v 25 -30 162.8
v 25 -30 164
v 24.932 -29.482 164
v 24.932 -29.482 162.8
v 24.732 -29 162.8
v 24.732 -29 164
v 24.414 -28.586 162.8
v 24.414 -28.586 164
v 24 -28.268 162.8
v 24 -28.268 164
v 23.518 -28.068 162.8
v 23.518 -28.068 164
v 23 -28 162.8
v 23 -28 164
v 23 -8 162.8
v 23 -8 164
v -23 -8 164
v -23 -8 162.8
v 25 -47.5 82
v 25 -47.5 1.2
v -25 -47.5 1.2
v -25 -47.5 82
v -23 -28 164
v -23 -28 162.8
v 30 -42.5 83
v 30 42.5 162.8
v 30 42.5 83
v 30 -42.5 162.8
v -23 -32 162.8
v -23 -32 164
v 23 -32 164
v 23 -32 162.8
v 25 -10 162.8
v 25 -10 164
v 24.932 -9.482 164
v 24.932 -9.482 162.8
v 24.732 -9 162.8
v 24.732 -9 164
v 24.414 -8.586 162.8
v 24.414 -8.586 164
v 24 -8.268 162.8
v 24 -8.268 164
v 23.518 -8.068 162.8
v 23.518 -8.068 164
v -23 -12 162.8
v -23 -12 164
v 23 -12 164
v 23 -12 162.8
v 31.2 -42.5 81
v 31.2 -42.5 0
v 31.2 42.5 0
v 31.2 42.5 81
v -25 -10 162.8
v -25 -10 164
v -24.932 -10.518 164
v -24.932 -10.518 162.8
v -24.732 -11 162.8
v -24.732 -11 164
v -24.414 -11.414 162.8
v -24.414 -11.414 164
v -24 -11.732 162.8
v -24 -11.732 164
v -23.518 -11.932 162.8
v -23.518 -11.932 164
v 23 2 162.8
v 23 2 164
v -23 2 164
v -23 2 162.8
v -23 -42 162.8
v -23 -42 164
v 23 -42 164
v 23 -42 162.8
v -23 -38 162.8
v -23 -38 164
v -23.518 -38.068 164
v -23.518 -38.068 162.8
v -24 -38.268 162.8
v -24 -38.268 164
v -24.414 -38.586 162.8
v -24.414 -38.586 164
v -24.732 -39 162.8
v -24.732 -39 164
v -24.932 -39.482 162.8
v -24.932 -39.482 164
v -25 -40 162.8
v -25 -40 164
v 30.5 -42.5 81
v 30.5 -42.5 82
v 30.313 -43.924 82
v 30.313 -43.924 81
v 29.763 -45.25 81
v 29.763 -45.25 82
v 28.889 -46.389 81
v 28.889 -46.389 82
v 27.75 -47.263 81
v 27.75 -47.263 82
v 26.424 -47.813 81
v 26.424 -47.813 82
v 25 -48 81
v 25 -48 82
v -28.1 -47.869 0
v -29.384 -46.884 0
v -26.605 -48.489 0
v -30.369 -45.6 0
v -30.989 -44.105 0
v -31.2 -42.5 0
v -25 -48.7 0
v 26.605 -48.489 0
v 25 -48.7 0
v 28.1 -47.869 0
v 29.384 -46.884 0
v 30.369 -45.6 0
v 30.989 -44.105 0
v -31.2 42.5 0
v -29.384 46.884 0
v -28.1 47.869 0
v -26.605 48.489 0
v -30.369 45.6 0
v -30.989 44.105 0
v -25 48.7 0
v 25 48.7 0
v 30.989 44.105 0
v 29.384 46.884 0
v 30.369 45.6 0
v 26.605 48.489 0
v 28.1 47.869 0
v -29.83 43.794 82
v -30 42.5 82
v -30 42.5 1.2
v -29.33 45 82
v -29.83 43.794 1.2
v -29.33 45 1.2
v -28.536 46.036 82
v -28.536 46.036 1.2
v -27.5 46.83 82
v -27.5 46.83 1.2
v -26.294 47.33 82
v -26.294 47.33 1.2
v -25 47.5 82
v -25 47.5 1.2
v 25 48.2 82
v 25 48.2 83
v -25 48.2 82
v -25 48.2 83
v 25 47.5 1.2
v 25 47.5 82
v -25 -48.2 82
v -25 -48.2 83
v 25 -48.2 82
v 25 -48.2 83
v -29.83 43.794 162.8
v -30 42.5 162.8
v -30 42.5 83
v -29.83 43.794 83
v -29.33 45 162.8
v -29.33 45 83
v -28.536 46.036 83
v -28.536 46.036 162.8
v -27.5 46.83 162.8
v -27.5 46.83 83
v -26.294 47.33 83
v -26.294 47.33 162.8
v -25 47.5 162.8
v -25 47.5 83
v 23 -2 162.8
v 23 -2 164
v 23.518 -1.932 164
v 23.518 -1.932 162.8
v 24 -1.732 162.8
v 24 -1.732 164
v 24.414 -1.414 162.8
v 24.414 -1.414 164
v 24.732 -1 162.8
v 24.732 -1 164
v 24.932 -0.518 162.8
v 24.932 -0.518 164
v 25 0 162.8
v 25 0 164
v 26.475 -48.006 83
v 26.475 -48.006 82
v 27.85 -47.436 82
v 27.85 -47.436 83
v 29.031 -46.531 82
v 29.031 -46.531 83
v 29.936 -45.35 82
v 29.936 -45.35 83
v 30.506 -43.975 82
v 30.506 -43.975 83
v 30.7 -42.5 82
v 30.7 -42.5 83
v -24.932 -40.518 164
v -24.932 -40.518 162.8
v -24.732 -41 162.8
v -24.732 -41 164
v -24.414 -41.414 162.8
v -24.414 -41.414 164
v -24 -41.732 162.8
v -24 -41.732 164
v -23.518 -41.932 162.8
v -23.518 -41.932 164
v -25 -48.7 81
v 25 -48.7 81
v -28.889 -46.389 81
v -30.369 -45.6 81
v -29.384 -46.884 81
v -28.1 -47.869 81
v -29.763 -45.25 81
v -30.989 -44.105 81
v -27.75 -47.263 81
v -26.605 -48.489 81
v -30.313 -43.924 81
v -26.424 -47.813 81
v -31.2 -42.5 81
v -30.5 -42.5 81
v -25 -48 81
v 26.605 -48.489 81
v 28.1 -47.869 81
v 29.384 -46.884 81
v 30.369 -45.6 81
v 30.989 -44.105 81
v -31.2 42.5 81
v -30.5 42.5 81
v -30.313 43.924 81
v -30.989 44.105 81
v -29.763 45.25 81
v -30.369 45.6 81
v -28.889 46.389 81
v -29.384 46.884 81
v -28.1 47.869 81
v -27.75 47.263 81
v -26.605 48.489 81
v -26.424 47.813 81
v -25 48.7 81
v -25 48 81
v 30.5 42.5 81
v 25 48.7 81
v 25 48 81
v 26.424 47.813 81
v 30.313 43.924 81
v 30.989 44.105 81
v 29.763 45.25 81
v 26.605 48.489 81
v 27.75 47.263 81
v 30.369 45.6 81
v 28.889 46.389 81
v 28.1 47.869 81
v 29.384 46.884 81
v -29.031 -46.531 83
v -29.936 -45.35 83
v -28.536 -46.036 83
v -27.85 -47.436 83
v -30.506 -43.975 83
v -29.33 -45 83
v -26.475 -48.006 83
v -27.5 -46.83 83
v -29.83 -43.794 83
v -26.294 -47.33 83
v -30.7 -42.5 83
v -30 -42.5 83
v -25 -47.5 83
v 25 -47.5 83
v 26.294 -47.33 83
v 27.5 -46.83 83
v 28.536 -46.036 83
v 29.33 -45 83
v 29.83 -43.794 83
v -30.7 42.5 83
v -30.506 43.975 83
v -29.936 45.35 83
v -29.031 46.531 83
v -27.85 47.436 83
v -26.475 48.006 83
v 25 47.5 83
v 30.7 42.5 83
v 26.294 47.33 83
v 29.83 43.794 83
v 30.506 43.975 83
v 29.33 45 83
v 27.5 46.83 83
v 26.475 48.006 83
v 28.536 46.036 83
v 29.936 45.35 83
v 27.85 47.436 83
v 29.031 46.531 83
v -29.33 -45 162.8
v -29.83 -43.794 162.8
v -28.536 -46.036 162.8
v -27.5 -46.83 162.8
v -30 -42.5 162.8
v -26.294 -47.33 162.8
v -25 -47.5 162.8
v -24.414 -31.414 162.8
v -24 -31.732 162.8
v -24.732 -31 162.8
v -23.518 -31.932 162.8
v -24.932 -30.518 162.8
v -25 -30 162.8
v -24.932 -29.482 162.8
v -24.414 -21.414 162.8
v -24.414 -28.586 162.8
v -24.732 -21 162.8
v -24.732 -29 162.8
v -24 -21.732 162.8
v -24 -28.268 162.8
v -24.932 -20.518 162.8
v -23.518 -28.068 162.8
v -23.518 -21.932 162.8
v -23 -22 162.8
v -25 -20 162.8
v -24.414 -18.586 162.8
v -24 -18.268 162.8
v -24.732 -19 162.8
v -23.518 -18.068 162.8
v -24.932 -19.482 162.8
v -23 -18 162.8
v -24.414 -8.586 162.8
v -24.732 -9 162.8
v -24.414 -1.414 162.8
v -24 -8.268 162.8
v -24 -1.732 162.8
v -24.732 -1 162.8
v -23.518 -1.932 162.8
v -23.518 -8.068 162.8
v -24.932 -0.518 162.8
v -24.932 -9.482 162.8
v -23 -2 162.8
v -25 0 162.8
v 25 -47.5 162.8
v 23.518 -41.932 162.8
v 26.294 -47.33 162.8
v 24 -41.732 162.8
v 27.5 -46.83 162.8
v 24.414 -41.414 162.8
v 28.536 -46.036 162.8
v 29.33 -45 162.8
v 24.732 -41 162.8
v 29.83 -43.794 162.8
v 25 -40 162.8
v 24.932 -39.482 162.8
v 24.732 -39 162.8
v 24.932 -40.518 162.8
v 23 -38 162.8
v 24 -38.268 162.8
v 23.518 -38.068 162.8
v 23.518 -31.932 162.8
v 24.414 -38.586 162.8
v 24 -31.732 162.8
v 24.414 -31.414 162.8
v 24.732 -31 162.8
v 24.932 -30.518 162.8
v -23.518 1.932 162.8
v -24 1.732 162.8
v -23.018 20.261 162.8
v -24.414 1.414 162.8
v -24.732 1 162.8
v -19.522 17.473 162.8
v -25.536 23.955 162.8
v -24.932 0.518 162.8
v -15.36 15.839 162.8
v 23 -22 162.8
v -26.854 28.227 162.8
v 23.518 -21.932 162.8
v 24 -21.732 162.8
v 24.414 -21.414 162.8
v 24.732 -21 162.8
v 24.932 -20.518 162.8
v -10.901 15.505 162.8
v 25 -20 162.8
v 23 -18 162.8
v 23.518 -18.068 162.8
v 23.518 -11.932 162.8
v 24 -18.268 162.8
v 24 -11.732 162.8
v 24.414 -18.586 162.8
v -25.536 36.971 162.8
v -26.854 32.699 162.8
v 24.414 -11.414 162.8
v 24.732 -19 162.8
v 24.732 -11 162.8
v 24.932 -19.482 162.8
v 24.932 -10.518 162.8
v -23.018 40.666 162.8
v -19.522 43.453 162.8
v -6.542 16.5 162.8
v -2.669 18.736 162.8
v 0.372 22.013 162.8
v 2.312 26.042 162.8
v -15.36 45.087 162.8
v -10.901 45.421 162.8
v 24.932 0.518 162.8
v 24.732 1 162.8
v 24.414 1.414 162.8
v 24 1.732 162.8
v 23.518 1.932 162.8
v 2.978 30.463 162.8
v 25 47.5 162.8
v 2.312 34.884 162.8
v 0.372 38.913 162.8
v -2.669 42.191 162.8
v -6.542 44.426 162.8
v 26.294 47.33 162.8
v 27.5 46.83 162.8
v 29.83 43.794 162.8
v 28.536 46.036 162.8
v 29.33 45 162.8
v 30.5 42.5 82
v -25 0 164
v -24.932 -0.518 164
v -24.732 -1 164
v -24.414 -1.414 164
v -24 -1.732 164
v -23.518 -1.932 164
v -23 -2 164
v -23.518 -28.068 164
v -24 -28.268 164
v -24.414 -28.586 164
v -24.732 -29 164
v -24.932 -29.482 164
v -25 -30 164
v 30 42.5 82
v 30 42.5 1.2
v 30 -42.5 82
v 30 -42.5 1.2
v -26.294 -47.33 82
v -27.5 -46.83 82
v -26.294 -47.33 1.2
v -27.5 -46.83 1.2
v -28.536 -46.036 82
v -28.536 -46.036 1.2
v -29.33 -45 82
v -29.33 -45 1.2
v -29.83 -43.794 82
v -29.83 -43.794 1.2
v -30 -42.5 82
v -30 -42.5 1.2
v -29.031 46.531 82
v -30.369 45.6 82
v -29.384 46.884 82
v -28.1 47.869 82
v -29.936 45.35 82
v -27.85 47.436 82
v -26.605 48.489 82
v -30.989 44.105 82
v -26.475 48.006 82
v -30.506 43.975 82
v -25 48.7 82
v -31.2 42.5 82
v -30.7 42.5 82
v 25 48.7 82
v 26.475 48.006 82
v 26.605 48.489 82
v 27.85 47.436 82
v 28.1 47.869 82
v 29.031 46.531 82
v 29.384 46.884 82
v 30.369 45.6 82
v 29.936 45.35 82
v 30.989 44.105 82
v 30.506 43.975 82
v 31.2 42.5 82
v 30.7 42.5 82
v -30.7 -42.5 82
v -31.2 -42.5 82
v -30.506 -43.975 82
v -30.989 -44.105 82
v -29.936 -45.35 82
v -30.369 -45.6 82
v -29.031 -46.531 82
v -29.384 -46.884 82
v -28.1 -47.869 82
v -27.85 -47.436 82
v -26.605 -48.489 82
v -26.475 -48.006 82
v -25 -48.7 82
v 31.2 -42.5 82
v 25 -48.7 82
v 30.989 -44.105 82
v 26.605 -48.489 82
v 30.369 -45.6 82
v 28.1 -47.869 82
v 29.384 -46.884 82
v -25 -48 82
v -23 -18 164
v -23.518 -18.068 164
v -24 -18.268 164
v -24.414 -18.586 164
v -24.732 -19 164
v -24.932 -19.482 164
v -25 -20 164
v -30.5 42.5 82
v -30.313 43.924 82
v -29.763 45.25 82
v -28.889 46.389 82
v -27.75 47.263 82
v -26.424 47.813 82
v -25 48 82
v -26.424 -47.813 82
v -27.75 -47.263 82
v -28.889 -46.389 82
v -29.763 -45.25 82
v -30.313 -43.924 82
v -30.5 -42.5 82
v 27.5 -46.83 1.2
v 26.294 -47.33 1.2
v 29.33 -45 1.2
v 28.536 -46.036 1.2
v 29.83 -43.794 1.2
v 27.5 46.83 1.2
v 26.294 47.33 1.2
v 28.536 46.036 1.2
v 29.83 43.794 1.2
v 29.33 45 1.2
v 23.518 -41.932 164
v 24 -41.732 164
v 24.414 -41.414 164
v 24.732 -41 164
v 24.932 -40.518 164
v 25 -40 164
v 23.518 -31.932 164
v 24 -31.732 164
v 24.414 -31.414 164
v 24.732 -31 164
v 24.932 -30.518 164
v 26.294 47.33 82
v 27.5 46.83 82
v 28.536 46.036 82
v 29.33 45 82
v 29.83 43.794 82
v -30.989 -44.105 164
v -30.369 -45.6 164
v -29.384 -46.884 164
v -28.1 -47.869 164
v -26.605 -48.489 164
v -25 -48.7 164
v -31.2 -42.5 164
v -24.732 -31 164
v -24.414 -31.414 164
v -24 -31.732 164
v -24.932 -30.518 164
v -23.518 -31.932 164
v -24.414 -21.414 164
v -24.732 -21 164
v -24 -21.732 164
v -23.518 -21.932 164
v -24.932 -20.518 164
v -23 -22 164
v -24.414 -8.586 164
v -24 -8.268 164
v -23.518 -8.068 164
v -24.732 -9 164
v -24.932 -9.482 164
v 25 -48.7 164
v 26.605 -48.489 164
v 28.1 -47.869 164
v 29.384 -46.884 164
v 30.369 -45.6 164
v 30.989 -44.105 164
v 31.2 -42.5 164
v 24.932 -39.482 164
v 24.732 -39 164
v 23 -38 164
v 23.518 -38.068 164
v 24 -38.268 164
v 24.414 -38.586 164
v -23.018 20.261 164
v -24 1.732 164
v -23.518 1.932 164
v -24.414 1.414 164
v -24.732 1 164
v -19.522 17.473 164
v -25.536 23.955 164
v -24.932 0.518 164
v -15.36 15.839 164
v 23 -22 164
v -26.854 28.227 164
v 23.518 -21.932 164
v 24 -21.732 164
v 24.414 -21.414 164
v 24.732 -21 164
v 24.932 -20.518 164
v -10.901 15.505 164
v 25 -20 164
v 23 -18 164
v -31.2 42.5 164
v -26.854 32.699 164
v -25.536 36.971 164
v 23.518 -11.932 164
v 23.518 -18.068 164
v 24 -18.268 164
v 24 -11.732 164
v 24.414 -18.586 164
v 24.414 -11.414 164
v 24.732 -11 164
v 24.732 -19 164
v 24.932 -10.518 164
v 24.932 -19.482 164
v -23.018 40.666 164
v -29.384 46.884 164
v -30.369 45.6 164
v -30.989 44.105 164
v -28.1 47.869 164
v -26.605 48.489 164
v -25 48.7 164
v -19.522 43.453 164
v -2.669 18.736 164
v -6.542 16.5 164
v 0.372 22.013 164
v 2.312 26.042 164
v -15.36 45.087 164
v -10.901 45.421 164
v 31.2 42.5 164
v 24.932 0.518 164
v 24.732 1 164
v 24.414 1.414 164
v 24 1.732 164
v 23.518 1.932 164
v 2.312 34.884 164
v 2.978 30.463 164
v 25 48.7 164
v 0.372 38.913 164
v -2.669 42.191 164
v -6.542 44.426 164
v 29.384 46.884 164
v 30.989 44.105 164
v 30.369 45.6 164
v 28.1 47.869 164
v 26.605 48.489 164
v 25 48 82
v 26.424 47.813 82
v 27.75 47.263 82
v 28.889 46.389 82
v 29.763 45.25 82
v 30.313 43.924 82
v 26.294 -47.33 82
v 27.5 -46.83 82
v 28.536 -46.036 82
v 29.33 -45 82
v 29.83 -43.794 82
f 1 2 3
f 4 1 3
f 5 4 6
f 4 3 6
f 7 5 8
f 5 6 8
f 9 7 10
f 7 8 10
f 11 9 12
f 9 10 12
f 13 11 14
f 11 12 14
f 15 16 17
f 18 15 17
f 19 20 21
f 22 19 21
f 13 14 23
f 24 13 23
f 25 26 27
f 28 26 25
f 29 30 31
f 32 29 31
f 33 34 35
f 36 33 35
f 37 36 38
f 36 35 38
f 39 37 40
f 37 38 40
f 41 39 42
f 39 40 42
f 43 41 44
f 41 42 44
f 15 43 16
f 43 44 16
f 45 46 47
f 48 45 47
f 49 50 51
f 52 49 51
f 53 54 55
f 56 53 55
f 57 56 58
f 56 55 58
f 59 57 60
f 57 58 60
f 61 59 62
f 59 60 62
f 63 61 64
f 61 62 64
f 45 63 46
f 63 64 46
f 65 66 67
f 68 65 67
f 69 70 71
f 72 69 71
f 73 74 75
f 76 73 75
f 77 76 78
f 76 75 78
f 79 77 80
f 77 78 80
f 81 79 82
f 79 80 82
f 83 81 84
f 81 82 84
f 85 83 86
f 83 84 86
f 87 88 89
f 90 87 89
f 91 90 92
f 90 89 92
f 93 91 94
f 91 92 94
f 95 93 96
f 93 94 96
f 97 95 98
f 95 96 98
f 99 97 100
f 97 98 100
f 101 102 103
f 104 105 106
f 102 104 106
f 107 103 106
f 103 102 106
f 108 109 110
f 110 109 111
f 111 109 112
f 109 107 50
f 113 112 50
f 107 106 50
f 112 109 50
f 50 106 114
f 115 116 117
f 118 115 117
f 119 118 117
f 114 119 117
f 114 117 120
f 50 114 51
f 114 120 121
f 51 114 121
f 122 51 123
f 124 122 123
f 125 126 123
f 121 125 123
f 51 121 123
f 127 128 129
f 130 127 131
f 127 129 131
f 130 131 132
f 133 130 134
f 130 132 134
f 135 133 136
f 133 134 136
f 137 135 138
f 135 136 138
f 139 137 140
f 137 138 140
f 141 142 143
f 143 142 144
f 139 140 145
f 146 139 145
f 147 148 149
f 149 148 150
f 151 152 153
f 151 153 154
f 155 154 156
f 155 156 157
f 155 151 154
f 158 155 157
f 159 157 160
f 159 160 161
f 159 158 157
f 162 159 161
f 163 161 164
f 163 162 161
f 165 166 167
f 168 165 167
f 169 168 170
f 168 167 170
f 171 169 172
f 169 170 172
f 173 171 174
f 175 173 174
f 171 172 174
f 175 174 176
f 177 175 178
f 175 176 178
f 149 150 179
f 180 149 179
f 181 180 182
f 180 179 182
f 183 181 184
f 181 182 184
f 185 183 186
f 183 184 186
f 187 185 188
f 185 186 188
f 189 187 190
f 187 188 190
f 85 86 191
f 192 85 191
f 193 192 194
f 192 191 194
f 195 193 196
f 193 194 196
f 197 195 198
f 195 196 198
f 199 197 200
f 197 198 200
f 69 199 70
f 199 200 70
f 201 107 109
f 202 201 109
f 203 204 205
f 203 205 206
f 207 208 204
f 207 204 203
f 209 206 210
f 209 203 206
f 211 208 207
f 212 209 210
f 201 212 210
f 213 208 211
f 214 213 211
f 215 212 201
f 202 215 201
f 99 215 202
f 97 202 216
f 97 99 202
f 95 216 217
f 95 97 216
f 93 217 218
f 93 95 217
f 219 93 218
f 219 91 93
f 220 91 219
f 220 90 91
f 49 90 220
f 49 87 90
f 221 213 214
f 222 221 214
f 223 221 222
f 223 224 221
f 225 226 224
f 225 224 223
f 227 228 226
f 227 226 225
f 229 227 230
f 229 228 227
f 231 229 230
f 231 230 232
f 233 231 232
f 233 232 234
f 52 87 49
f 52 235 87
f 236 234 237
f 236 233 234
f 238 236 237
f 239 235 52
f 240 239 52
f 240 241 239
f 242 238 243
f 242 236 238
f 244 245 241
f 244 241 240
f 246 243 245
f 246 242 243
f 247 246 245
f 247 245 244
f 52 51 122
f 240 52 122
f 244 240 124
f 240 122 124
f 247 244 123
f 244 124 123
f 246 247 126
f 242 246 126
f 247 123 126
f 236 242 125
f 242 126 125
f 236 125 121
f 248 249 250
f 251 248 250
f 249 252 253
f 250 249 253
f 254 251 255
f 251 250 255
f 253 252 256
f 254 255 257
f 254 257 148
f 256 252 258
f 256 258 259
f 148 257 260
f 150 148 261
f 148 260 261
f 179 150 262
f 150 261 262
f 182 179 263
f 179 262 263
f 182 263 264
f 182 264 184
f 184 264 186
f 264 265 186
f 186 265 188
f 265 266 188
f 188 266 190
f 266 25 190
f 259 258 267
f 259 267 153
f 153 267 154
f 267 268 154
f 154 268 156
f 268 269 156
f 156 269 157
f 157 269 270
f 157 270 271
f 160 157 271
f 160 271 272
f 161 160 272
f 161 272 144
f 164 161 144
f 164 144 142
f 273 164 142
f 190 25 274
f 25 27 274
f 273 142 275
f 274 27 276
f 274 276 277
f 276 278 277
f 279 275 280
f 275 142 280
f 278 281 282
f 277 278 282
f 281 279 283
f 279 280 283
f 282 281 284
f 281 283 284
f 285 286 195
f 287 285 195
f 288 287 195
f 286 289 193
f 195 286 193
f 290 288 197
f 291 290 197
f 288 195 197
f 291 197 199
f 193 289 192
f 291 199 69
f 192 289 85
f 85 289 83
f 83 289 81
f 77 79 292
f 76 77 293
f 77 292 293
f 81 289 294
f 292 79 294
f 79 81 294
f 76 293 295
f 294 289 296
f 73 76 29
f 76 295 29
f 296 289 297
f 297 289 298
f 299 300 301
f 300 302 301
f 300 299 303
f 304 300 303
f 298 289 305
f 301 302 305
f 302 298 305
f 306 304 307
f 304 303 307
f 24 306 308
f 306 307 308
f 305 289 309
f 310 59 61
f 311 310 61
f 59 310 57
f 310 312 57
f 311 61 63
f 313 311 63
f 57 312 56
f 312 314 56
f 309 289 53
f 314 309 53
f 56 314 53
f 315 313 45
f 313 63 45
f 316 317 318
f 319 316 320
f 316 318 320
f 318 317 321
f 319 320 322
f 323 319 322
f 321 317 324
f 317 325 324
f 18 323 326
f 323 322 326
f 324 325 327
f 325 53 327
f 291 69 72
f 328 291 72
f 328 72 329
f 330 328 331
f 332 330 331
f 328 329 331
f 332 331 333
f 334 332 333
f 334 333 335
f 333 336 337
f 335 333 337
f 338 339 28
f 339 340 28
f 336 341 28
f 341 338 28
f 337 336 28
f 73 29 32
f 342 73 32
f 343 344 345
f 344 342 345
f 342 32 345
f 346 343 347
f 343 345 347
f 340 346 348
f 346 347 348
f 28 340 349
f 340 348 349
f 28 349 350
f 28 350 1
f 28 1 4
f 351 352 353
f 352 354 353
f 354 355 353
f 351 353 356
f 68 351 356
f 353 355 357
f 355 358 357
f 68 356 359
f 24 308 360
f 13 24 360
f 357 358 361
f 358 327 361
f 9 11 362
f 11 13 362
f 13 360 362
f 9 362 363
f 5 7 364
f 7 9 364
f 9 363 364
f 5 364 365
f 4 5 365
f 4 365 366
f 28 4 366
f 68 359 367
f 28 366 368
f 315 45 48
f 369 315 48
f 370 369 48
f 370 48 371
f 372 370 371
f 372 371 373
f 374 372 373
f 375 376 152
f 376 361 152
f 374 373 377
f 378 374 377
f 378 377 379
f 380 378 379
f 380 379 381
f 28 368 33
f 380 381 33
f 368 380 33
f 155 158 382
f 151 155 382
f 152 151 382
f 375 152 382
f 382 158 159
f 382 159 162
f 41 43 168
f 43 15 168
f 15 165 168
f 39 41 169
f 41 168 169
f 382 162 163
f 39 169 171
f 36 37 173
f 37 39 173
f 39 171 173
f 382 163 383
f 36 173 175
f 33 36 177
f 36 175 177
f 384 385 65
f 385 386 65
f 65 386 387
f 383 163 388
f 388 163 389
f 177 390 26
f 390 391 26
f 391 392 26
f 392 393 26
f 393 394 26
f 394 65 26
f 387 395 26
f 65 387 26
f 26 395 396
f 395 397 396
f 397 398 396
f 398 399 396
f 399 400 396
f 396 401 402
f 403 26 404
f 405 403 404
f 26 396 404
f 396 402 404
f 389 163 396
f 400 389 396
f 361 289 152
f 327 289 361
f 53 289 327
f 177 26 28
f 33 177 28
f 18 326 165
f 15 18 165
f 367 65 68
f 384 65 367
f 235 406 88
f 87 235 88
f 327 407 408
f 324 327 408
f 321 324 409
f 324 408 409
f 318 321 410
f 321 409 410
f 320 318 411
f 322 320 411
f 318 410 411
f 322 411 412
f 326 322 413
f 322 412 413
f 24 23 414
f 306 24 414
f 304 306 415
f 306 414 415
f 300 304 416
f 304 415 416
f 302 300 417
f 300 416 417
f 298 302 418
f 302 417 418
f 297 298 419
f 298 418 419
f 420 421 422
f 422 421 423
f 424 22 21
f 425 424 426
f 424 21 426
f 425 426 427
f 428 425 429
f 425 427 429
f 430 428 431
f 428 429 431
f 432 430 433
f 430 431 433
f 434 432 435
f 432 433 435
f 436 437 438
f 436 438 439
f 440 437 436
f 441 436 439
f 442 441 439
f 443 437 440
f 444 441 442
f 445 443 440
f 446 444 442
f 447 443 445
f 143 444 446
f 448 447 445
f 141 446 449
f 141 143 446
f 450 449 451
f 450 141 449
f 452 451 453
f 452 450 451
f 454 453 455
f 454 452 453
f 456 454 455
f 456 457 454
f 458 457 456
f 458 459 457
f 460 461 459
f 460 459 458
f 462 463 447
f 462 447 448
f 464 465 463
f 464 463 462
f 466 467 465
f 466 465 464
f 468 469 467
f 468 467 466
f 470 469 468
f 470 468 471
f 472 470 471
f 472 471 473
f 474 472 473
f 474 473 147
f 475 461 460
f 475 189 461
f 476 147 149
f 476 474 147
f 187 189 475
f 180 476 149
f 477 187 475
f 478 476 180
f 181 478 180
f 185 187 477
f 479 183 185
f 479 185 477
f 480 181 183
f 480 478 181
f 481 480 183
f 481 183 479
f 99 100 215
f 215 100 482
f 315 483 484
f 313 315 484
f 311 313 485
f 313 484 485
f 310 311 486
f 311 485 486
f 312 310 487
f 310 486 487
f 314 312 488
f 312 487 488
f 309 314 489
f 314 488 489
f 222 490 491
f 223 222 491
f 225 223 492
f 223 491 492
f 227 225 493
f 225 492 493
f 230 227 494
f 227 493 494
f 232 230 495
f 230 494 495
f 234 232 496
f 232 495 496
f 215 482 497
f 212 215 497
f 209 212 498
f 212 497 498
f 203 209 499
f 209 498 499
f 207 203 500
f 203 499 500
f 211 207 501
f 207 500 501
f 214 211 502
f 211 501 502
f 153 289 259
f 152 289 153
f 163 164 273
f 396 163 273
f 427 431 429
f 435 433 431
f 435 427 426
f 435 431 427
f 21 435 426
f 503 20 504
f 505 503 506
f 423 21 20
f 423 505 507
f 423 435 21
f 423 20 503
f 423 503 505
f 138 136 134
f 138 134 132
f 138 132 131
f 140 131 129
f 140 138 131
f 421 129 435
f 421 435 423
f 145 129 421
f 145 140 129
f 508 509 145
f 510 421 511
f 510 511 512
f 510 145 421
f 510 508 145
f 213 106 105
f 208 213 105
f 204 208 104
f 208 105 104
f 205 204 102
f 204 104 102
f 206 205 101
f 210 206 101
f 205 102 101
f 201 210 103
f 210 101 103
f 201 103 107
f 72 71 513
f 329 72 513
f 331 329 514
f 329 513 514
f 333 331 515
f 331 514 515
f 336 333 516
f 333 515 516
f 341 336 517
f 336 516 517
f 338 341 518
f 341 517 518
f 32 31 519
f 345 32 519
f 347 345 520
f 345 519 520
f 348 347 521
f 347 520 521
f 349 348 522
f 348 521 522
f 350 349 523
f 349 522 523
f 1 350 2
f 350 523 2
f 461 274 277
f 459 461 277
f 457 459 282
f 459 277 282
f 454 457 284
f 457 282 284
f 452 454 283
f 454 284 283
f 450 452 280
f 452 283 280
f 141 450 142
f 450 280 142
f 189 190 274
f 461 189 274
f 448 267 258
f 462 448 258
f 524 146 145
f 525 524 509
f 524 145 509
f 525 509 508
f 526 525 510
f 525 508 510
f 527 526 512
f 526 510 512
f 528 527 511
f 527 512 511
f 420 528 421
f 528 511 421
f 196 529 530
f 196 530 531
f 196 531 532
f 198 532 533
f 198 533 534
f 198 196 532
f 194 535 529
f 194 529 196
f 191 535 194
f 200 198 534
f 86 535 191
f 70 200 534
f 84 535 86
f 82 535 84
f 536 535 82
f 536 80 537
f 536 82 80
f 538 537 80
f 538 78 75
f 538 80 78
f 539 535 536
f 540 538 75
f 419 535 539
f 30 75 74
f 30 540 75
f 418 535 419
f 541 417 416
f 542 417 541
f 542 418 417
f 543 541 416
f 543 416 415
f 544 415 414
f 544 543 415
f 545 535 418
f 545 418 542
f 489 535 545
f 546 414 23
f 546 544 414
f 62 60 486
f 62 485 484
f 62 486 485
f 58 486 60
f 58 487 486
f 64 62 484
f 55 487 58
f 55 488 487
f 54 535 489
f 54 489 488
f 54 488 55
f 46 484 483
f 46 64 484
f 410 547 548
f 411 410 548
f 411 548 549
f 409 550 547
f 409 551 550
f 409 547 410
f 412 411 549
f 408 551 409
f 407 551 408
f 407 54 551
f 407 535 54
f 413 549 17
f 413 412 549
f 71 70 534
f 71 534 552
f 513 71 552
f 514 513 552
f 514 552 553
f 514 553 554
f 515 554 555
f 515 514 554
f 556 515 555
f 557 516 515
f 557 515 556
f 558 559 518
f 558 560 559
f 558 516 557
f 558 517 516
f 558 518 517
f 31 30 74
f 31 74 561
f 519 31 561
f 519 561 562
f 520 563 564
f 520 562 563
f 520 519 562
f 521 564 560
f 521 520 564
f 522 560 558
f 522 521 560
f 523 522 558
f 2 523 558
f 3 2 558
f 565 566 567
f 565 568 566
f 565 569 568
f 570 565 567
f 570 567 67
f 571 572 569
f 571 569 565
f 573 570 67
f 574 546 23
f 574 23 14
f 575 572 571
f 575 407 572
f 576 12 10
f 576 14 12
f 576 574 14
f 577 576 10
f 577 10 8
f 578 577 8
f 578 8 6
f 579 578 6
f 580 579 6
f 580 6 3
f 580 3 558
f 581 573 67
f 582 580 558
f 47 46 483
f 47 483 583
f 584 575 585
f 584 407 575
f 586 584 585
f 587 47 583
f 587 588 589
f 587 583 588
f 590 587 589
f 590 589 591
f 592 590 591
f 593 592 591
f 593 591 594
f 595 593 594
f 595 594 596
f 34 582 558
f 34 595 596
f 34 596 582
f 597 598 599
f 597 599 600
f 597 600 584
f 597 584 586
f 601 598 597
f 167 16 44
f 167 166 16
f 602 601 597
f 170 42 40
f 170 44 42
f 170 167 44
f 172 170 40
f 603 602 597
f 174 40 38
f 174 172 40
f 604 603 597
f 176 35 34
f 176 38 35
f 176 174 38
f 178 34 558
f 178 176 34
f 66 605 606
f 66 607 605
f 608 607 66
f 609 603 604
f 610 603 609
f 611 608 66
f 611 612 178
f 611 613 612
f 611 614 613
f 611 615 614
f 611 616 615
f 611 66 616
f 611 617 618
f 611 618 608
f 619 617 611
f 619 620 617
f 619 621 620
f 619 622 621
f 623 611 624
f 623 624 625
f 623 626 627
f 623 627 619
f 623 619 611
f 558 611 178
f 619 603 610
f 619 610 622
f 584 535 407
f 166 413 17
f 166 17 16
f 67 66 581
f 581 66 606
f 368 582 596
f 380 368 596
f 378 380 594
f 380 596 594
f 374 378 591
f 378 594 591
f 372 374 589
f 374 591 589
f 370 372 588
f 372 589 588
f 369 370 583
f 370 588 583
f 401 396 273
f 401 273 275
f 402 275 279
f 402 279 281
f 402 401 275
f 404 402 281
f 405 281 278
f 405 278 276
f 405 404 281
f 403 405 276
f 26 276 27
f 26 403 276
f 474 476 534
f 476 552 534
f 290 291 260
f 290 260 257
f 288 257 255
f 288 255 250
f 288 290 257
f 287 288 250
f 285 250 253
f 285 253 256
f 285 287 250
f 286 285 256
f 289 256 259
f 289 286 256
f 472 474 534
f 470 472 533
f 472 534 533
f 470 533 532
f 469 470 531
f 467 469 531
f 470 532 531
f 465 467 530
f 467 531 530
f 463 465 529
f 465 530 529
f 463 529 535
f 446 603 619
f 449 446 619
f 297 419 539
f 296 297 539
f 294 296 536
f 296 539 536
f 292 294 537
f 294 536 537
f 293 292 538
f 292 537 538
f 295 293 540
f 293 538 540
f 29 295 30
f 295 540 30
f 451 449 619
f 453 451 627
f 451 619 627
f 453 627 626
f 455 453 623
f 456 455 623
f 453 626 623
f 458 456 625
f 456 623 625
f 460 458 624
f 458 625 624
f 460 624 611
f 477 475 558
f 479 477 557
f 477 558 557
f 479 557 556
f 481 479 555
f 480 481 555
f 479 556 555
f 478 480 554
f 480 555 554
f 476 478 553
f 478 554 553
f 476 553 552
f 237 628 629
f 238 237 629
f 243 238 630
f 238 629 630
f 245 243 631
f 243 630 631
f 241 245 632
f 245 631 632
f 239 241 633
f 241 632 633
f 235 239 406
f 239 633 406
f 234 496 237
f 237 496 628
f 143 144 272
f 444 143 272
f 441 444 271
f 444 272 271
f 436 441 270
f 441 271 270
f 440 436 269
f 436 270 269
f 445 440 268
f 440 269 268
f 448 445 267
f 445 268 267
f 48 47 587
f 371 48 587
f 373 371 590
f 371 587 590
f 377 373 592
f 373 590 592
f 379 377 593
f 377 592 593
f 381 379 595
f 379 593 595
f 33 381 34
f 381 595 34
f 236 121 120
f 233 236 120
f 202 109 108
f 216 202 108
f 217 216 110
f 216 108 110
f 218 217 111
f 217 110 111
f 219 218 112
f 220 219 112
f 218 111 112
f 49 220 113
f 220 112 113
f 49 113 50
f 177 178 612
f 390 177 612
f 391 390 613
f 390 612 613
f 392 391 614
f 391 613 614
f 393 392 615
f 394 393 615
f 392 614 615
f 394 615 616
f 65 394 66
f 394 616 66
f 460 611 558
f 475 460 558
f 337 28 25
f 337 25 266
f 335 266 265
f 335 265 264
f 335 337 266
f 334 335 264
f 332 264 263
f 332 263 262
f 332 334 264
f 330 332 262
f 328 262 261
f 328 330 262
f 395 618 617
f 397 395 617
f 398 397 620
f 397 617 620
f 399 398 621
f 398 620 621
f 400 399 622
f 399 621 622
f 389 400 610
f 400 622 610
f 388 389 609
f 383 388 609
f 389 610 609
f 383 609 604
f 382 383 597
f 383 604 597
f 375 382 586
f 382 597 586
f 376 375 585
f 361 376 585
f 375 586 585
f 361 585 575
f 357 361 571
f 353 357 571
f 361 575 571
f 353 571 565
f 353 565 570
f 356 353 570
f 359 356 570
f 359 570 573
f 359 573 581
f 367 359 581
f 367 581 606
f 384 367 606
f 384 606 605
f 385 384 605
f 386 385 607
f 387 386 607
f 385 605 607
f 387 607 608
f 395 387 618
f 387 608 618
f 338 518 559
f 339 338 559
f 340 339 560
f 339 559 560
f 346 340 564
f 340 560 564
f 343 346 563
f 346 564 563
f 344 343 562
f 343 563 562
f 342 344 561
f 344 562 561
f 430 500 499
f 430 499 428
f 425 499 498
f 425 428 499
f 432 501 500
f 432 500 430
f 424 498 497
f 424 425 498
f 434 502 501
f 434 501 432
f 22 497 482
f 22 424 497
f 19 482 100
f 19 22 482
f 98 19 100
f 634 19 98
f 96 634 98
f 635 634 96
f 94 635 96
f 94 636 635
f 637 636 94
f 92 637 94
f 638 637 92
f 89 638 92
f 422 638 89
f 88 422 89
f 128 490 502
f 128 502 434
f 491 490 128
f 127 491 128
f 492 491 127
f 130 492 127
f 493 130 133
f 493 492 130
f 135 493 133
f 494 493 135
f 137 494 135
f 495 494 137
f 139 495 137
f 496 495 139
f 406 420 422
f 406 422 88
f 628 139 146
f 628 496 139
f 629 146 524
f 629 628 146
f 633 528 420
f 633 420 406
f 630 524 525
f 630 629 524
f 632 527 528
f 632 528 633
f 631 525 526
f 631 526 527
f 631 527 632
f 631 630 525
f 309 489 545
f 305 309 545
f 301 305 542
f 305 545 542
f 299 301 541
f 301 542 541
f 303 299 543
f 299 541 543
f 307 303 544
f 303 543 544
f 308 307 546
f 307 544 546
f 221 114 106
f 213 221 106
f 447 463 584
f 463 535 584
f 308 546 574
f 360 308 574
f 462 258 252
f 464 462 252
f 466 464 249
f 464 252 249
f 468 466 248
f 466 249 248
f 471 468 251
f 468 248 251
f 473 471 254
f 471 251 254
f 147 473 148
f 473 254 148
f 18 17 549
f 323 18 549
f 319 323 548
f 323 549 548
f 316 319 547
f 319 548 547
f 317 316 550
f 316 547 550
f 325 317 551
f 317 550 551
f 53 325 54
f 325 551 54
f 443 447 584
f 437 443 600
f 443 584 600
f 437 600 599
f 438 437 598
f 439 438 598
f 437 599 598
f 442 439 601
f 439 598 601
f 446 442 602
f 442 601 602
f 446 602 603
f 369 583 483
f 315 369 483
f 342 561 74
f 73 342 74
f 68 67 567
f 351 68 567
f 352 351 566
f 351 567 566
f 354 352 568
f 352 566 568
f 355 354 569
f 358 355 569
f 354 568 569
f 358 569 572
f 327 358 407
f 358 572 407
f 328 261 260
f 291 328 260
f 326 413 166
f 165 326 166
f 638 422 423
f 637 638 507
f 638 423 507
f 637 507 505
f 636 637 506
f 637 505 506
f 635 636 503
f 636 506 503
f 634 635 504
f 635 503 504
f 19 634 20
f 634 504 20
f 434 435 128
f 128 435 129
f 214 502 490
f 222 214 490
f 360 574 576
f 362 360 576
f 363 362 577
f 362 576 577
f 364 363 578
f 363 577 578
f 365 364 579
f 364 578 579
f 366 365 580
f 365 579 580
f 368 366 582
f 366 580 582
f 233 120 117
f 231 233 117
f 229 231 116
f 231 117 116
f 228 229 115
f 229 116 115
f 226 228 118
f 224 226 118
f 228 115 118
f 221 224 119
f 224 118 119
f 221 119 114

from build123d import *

# Parameters (mm, degrees)
F1_DEPTH  = 82
F2_DEPTH  = 1.2
F4_DEPTH  = 1
F7_DEPTH  = 1
F8_DEPTH  = 1
F9_R      = 15
F10_DEPTH = 1.2


# Not quite as in the source:
# - a feature names something its author has since deleted; it is built from what else it names


with BuildPart() as f1:
    # F0 (on Top) → F1 (new body)
    with BuildSketch(Plane.XY):
        with BuildLine():
            Line((31.2, -42.5), (31.2, 42.5))
            ThreePointArc((31.2, 42.5), (29.3840620434, 46.8840620434), (25, 48.7))
            Line((25, 48.7), (-25, 48.7))
            ThreePointArc((-25, 48.7), (-29.3840620434, 46.8840620434), (-31.2, 42.5))
            Line((-31.2, 42.5), (-31.2, -42.5))
            ThreePointArc((-31.2, -42.5), (-29.3840620434, -46.8840620434), (-25, -48.7))
            Line((-25, -48.7), (25, -48.7))
            ThreePointArc((25, -48.7), (29.3840620434, -46.8840620434), (31.2, -42.5))
        make_face()
        with BuildLine():
            Line((-25, 47.5), (25, 47.5))
            ThreePointArc((25, 47.5), (28.5355339059, 46.0355339059), (30, 42.5))
            Line((30, 42.5), (30, -42.5))
            ThreePointArc((30, -42.5), (28.5355339059, -46.0355339059), (25, -47.5))
            Line((25, -47.5), (-25, -47.5))
            ThreePointArc((-25, -47.5), (-28.5355339059, -46.0355339059), (-30, -42.5))
            Line((-30, -42.5), (-30, 42.5))
            ThreePointArc((-30, 42.5), (-28.5355339059, 46.0355339059), (-25, 47.5))
        make_face(mode=Mode.SUBTRACT)
    extrude(amount=F1_DEPTH)

    # F0 (on Top) → F2 (join)
    with BuildSketch(Plane.XY):
        with BuildLine():
            ThreePointArc((30, 42.5), (28.5355339059, 46.0355339059), (25, 47.5))
            Line((25, 47.5), (-25, 47.5))
            ThreePointArc((-25, 47.5), (-28.5355339059, 46.0355339059), (-30, 42.5))
            Line((-30, 42.5), (-30, -42.5))
            ThreePointArc((-30, -42.5), (-28.5355339059, -46.0355339059), (-25, -47.5))
            Line((-25, -47.5), (25, -47.5))
            ThreePointArc((25, -47.5), (28.5355339059, -46.0355339059), (30, -42.5))
            Line((30, -42.5), (30, 42.5))
        make_face()
    extrude(amount=F2_DEPTH)

    # F3 (on face) → F4 (cut)
    with BuildSketch(Plane.XY.offset(82)):
        with BuildLine():
            ThreePointArc((25, -48.7), (29.3840620434, -46.8840620434), (31.2, -42.5))
            Line((31.2, -42.5), (31.2, 42.5))
            ThreePointArc((31.2, 42.5), (29.3840620434, 46.8840620434), (25, 48.7))
            Line((25, 48.7), (-25, 48.7))
            ThreePointArc((-25, 48.7), (-29.3840620434, 46.8840620434), (-31.2, 42.5))
            Line((-31.2, 42.5), (-31.2, -42.5))
            ThreePointArc((-31.2, -42.5), (-29.3840620434, -46.8840620434), (-25, -48.7))
            Line((-25, -48.7), (25, -48.7))
        make_face()
        with BuildLine():
            ThreePointArc((-25, -48), (-28.8890872965, -46.3890872965), (-30.5, -42.5))
            Line((-30.5, -42.5), (-30.5, 42.5))
            ThreePointArc((-30.5, 42.5), (-28.8890872965, 46.3890872965), (-25, 48))
            Line((-25, 48), (25, 48))
            ThreePointArc((25, 48), (28.8890872965, 46.3890872965), (30.5, 42.5))
            Line((30.5, 42.5), (30.5, -42.5))
            ThreePointArc((30.5, -42.5), (28.8890872965, -46.3890872965), (25, -48))
            Line((25, -48), (-25, -48))
        make_face(mode=Mode.SUBTRACT)
    extrude(amount=-F4_DEPTH, mode=Mode.SUBTRACT)


with BuildPart() as f5_1:
    # F5: instance of F1
    add(f1.part.mirror(Plane.XY.offset(82)))

    # F6 (on face) → F7 (join)
    with BuildSketch(Plane(origin=(0, 0, 83), x_dir=(1, 0, 0), z_dir=(0, 0, -1))):
        with BuildLine():
            Line((31.2, -42.5), (31.2, 42.5))
            ThreePointArc((31.2, 42.5), (29.3840620434, 46.8840620434), (25, 48.7))
            Line((25, 48.7), (-25, 48.7))
            ThreePointArc((-25, 48.7), (-29.3840620434, 46.8840620434), (-31.2, 42.5))
            Line((-31.2, 42.5), (-31.2, -42.5))
            ThreePointArc((-31.2, -42.5), (-29.3840620434, -46.8840620434), (-25, -48.7))
            Line((-25, -48.7), (25, -48.7))
            ThreePointArc((25, -48.7), (29.3840620434, -46.8840620434), (31.2, -42.5))
        make_face()
        with BuildLine():
            ThreePointArc((25, 48.2), (29.0305086528, 46.5305086528), (30.7, 42.5))
            Line((30.7, 42.5), (30.7, -42.5))
            ThreePointArc((30.7, -42.5), (29.0305086528, -46.5305086528), (25, -48.2))
            Line((25, -48.2), (-25, -48.2))
            ThreePointArc((-25, -48.2), (-29.0305086528, -46.5305086528), (-30.7, -42.5))
            Line((-30.7, -42.5), (-30.7, 42.5))
            ThreePointArc((-30.7, 42.5), (-29.0305086528, 46.5305086528), (-25, 48.2))
            Line((-25, 48.2), (25, 48.2))
        make_face(mode=Mode.SUBTRACT)
    extrude(amount=F7_DEPTH)

    # F8 (cut): a face of the model
    f8_faces = [f5_1.faces().sort_by_distance(p)[0] for p in [
        (28.808660311, -46.308660311, 82),
    ]]
    extrude(f8_faces, amount=-F8_DEPTH, mode=Mode.SUBTRACT)

    # F9 (on face) → F10 (cut)
    with BuildSketch(Plane.XY.offset(164)):
        with Locations((-12.0217995225, 30.4631138757)):
            Circle(F9_R)
        with BuildLine():
            ThreePointArc((25, 0), (24.4142135624, 1.4142135624), (23, 2))
            Line((23, 2), (-23, 2))
            ThreePointArc((-23, 2), (-24.4142135624, 1.4142135624), (-25, 0))
            ThreePointArc((-25, 0), (-24.4142135624, -1.4142135624), (-23, -2))
            Line((-23, -2), (23, -2))
            ThreePointArc((23, -2), (24.4142135624, -1.4142135624), (25, 0))
        make_face()
        with BuildLine():
            ThreePointArc((-23, -8), (-24.4142135624, -8.5857864376), (-25, -10))
            ThreePointArc((-25, -10), (-24.4142135624, -11.4142135624), (-23, -12))
            Line((-23, -12), (23, -12))
            ThreePointArc((23, -12), (24.4142135624, -11.4142135624), (25, -10))
            ThreePointArc((25, -10), (24.4142135624, -8.5857864376), (23, -8))
            Line((23, -8), (-23, -8))
        make_face()
        with BuildLine():
            ThreePointArc((-23, -18), (-24.4142135624, -18.5857864376), (-25, -20))
            ThreePointArc((-25, -20), (-24.4142135624, -21.4142135624), (-23, -22))
            Line((-23, -22), (23, -22))
            ThreePointArc((23, -22), (24.4142135624, -21.4142135624), (25, -20))
            ThreePointArc((25, -20), (24.4142135624, -18.5857864376), (23, -18))
            Line((23, -18), (-23, -18))
        make_face()
        with BuildLine():
            ThreePointArc((-23, -28), (-24.4142135624, -28.5857864376), (-25, -30))
            ThreePointArc((-25, -30), (-24.4142135624, -31.4142135624), (-23, -32))
            Line((-23, -32), (23, -32))
            ThreePointArc((23, -32), (24.4142135624, -31.4142135624), (25, -30))
            ThreePointArc((25, -30), (24.4142135624, -28.5857864376), (23, -28))
            Line((23, -28), (-23, -28))
        make_face()
        with BuildLine():
            ThreePointArc((-23, -38), (-24.4142135624, -38.5857864376), (-25, -40))
            ThreePointArc((-25, -40), (-24.4142135624, -41.4142135624), (-23, -42))
            Line((-23, -42), (23, -42))
            ThreePointArc((23, -42), (24.4142135624, -41.4142135624), (25, -40))
            ThreePointArc((25, -40), (24.4142135624, -38.5857864376), (23, -38))
            Line((23, -38), (-23, -38))
        make_face()
    extrude(amount=-F10_DEPTH, mode=Mode.SUBTRACT)


solid = Compound([f1.part, f5_1.part])
